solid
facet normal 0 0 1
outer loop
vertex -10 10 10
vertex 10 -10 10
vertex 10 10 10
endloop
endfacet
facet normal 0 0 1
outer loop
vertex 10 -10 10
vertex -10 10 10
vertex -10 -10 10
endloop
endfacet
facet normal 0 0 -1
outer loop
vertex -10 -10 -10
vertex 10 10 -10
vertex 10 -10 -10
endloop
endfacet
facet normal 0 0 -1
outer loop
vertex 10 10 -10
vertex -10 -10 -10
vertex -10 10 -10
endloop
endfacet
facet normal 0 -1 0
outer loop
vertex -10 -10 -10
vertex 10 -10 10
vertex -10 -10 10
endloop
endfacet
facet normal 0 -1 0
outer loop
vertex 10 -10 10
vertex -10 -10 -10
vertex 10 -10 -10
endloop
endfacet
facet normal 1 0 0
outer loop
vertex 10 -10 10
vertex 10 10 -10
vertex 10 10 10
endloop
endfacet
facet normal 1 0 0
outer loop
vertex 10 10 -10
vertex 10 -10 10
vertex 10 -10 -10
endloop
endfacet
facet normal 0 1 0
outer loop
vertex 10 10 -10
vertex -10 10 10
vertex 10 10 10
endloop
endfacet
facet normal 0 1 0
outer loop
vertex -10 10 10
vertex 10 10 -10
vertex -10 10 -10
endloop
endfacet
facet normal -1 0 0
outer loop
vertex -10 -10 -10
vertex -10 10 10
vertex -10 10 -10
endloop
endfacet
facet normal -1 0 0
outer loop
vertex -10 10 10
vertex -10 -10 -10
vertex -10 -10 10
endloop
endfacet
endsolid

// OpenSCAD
// file: ../lib/common.scad
// common.scad — shared helpers for this repo's OpenSCAD projects.
// Use with:  use <../lib/common.scad>
// For richer primitives prefer BOSL2 (on OPENSCADPATH): include <BOSL2/std.scad>

// 2D rounded rectangle, centered.
module rrect(w, h, r) {
  offset(r = r) square([w - 2 * r, h - 2 * r], center = true);
}

// Angular sector polygon (centered on the origin), z0..z1 extruded.
// Handy for cutting a "mouth" or windows out of a ring.
module ring_sector(radius, center_angle, half_angle, z0, z1, step = 2) {
  translate([0, 0, z0])
    linear_extrude(z1 - z0)
      polygon(concat(
        [[0, 0]],
        [for (t = [center_angle - half_angle : step : center_angle + half_angle])
          [radius * cos(t), radius * sin(t)]]
      ));
}

// Snap-in C clip that stands off the current top face (+Z); mouth opens toward +X.
module cable_clip(cable_dia = 4, wall = 2) {
  cr = cable_dia / 2;
  difference() {
    cylinder(h = cable_dia + wall, r = cr + wall);
    translate([0, 0, -1]) cylinder(h = cable_dia + wall + 2, r = cr);
    translate([0, -cr * 0.8, -1]) cube([cr + wall + 2, cr * 1.6, cable_dia + wall + 2]);
  }
}

// Round "puck" with a flat base, straight cylindrical wall, and a shallow domed top
// (e.g. the Athom / IoTorero device). Height is measured at the centre of the dome.
module dome_puck(dia, straight_h, total_h) {
  a = dia / 2;
  dome_h = total_h - straight_h;
  Rcap = (a * a + dome_h * dome_h) / (2 * dome_h);
  union() {
    cylinder(h = straight_h, r = a);
    translate([0, 0, straight_h]) intersection() {
      translate([0, 0, dome_h - Rcap]) sphere(r = Rcap);
      cylinder(h = dome_h, r = a + 1);
    }
  }
}
// main file
// <project> — one-line description
//
// Shared helpers:   use <../lib/common.scad>
// BOSL2 primitives: include <BOSL2/std.scad>   (on OPENSCADPATH via the flake)

use <../lib/common.scad>

// ---------- Parameters ----------
SIZE = 20;   // mm

$fn = 96;

// ---------- Model ----------
cube(SIZE, center = true);
